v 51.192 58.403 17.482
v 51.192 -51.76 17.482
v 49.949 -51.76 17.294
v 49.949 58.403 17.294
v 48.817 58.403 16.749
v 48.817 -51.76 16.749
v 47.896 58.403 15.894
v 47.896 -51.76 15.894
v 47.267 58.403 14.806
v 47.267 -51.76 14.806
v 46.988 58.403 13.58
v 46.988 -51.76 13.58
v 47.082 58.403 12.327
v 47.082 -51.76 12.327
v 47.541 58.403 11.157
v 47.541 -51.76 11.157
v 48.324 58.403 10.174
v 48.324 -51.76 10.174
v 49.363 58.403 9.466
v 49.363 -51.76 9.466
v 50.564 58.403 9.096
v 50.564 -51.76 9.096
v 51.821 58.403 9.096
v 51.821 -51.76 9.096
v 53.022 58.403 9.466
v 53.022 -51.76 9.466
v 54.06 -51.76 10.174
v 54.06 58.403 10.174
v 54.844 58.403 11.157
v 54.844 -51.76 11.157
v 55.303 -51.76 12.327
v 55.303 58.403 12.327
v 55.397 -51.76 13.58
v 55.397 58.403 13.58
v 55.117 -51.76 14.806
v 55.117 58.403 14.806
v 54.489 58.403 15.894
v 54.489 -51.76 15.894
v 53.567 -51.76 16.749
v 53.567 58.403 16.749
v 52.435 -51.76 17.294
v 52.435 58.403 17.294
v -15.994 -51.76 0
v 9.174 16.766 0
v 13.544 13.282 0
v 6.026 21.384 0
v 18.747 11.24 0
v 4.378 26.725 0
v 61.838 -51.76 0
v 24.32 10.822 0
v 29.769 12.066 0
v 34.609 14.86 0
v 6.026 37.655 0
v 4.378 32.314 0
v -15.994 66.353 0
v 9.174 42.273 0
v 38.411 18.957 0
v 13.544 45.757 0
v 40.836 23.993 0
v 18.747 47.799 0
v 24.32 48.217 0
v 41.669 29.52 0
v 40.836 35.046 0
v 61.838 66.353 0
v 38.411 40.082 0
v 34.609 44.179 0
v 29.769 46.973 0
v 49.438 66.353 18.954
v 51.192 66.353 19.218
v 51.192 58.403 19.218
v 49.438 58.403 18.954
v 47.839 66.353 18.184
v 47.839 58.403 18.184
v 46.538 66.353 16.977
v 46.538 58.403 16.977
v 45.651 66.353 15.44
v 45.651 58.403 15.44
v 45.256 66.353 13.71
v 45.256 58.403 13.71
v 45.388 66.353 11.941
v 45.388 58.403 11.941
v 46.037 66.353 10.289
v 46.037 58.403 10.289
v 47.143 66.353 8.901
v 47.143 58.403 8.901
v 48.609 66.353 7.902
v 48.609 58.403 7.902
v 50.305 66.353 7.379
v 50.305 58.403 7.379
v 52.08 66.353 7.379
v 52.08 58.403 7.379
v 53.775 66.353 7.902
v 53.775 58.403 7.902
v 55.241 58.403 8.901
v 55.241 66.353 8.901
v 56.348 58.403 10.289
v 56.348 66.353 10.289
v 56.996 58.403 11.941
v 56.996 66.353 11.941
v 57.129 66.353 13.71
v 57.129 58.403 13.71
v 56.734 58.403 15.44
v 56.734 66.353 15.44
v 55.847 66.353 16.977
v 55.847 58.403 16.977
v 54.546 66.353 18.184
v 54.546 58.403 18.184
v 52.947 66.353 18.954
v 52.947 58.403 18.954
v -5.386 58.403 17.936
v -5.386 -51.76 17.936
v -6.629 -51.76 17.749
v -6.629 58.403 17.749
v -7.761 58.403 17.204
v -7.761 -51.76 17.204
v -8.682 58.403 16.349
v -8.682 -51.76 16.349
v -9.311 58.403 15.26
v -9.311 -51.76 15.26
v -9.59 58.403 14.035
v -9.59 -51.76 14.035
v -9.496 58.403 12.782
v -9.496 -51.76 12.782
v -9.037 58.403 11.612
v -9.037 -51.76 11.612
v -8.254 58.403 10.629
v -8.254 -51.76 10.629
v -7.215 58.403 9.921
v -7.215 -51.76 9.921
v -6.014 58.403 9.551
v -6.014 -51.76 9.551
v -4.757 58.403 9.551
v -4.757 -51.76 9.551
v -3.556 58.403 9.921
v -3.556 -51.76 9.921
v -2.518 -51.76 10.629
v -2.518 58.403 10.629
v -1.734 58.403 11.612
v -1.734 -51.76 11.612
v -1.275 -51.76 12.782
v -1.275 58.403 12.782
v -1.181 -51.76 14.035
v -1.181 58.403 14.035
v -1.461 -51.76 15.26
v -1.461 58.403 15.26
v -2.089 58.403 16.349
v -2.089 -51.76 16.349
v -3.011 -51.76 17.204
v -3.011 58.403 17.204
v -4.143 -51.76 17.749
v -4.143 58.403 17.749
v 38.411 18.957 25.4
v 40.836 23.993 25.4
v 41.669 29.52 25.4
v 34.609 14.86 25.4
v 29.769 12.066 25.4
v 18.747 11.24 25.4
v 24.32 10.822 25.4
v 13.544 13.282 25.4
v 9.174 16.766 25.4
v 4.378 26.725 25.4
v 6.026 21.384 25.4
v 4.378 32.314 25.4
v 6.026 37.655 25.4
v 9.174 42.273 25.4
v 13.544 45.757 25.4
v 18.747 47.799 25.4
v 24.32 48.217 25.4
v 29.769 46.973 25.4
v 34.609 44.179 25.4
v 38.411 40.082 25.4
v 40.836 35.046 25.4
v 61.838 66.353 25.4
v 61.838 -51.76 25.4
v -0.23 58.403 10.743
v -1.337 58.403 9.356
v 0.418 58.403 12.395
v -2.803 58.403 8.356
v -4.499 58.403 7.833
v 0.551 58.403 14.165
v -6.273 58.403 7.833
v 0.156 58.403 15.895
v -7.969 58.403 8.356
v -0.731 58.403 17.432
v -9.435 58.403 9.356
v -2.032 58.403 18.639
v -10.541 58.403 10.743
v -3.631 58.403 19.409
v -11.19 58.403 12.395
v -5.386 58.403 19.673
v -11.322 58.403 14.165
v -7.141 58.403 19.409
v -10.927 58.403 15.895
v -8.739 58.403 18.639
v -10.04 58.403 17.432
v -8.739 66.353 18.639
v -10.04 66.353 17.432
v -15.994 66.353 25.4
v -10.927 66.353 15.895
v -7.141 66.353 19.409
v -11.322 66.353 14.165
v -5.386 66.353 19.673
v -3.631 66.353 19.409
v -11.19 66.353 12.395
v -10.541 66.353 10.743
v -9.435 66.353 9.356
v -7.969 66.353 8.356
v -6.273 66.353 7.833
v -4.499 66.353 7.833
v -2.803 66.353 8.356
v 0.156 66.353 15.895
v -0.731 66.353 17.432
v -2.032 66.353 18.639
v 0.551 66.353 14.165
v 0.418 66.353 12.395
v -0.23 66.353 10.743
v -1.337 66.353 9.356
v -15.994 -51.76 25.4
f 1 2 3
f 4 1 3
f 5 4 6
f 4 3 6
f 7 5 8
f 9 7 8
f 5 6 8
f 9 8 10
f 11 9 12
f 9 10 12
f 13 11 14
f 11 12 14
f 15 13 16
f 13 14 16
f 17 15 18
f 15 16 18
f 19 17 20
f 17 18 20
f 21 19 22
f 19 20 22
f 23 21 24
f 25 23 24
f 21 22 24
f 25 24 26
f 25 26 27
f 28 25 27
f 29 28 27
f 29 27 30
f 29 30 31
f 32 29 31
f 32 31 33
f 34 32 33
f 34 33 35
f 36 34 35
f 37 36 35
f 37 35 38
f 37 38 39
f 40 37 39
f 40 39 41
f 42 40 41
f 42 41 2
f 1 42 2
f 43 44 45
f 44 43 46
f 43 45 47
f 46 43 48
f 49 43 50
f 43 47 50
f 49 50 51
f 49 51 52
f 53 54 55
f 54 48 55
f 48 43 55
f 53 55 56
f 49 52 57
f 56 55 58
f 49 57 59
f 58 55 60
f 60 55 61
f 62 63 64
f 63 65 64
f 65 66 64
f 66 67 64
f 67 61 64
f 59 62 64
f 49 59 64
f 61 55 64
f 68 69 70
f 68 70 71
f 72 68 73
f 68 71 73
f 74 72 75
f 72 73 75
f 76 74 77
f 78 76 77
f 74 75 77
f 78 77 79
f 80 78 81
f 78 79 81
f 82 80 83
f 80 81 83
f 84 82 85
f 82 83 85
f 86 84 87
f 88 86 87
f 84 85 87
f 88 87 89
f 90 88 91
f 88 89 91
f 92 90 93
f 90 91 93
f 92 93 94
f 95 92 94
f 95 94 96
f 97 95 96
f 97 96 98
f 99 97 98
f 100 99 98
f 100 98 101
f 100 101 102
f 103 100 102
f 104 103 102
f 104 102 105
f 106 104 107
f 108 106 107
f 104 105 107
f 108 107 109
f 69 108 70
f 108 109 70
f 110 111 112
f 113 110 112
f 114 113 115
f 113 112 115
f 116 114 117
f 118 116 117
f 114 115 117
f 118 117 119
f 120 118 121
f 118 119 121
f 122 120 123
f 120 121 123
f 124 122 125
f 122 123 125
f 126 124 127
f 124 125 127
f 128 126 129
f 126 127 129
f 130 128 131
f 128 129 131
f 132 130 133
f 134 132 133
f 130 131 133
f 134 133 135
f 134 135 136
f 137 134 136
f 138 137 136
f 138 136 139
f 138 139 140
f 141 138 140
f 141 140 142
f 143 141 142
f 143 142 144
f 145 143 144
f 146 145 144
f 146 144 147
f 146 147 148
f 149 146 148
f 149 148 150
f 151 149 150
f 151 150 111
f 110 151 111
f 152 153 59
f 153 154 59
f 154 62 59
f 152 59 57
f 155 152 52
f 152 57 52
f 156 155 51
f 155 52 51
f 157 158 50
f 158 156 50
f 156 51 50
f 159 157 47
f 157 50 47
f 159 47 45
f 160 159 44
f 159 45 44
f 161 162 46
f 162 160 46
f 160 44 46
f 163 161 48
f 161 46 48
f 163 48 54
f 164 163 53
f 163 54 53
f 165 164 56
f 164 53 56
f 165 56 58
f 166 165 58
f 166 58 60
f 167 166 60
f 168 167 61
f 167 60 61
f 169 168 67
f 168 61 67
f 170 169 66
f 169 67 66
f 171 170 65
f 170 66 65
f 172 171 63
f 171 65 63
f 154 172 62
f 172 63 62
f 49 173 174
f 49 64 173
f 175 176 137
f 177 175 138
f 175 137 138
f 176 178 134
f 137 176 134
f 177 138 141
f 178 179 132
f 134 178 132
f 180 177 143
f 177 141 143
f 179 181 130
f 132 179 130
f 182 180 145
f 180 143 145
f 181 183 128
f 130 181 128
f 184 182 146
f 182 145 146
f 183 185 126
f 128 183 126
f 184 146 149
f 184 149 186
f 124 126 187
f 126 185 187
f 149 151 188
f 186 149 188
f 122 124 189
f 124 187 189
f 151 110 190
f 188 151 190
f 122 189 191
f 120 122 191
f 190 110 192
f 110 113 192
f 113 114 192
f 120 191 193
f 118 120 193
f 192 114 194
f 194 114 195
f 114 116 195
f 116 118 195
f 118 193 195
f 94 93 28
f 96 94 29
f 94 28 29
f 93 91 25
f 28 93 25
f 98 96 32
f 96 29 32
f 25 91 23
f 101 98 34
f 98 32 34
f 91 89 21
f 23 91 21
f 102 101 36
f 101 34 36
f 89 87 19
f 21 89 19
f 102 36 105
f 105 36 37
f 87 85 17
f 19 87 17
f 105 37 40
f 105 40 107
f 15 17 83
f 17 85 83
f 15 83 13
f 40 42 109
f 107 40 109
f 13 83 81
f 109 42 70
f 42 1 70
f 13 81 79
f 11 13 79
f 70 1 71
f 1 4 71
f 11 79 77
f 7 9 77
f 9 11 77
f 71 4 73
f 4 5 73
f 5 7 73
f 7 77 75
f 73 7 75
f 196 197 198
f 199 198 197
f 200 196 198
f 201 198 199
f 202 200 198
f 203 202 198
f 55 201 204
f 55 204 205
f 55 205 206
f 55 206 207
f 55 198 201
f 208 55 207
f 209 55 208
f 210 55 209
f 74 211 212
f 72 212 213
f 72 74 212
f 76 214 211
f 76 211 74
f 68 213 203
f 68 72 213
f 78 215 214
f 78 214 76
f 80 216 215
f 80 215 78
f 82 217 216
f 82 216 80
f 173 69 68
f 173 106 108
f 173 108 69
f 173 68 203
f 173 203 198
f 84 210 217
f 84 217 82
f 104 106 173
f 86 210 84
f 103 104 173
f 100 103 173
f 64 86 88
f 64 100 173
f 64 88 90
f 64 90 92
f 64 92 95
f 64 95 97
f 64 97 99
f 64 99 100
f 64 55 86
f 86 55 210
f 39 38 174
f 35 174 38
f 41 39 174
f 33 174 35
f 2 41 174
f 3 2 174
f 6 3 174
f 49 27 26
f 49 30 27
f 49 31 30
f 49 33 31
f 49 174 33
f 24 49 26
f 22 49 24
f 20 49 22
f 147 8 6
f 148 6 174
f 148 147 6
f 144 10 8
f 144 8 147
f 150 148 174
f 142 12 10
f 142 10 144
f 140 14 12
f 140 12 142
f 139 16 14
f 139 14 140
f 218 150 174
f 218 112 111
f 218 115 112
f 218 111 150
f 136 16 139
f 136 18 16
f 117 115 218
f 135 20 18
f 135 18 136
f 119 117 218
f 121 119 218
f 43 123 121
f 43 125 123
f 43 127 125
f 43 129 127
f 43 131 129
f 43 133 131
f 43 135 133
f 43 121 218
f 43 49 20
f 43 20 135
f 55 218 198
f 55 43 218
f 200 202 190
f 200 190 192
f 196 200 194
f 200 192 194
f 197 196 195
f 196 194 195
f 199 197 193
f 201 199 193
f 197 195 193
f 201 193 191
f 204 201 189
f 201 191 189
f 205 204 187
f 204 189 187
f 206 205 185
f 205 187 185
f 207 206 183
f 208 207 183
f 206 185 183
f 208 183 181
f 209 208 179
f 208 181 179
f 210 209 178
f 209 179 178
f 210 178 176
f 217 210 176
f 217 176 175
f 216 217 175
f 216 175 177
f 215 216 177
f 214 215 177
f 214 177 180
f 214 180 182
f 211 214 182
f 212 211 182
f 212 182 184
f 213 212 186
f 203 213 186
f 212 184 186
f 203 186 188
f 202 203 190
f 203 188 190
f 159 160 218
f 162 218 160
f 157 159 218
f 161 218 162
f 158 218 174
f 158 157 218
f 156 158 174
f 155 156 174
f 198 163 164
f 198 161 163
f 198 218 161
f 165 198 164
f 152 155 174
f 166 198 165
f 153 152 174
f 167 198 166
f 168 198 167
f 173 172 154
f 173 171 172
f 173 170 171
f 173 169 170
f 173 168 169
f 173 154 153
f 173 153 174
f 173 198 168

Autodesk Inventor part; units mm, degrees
ref_plane "YZ Plane" through (0, 0, 0) normal (1, 0, 0) x (0, 1, 0)
ref_plane "XZ Plane" through (0, 0, 0) normal (0, 1, 0) x (-1, 0, 0)
ref_plane "XY Plane" through (0, 0, 0) normal (0, 0, 1) x (1, 0, 0)
sketch "Sketch1" plane through (0, 0, 0) normal (0, 0, 1) x (1, 0, 0)
  circle A0 centre (22.919, 29.5195) radius 18.75
  line L0 (-15.9938, 66.3532) -> (61.8383, 66.3532)
  line L1 (61.8383, 66.3532) -> (61.8383, -51.7605)
  line L2 (61.8383, -51.7605) -> (-15.9938, -51.7605)
  line L3 (-15.9938, -51.7605) -> (-15.9938, 66.3532)
  point P0 (0, 0)
  dimension "d0" = 37.5
  dimension "d1" = 77.8321
  dimension "d2" = 118.1137
  dimension "d3" = 38.9128
  dimension "d4" = 81.28
extrude "Extrusion1" add sketch "Sketch1" along normal blind 25.4
sketch "Sketch2" plane through (-15.9938, 66.3532, 0) normal (0, 1, 0) x (1, 0, 0)
  point P0 (15.9938, 0)
  point P1 (10.6081, -13.72)
hole "Hole1" at (-5.3858, 66.3532, 13.72) direction (0, -1, 0) diameter 8.4328 end through all counterbore diameter 11.9062 counterbore depth 7.9502 clearance for "Socket Head Cap Screw" size "5/16" standard "Ansi Unified Screw Threads"
sketch "Sketch3" plane through (-15.9938, 66.3532, 0) normal (0, 1, 0) x (1, 0, 0)
  point P0 (15.9938, 0)
  point P1 (67.1861, -13.2652)
hole "Hole2" at (51.1923, 66.3532, 13.2652) direction (0, -1, 0) diameter 8.4328 end through all counterbore diameter 11.9062 counterbore depth 7.9502 clearance for "Socket Head Cap Screw" size "5/16" standard "Ansi Unified Screw Threads"
properties part number "Wrist Support"
